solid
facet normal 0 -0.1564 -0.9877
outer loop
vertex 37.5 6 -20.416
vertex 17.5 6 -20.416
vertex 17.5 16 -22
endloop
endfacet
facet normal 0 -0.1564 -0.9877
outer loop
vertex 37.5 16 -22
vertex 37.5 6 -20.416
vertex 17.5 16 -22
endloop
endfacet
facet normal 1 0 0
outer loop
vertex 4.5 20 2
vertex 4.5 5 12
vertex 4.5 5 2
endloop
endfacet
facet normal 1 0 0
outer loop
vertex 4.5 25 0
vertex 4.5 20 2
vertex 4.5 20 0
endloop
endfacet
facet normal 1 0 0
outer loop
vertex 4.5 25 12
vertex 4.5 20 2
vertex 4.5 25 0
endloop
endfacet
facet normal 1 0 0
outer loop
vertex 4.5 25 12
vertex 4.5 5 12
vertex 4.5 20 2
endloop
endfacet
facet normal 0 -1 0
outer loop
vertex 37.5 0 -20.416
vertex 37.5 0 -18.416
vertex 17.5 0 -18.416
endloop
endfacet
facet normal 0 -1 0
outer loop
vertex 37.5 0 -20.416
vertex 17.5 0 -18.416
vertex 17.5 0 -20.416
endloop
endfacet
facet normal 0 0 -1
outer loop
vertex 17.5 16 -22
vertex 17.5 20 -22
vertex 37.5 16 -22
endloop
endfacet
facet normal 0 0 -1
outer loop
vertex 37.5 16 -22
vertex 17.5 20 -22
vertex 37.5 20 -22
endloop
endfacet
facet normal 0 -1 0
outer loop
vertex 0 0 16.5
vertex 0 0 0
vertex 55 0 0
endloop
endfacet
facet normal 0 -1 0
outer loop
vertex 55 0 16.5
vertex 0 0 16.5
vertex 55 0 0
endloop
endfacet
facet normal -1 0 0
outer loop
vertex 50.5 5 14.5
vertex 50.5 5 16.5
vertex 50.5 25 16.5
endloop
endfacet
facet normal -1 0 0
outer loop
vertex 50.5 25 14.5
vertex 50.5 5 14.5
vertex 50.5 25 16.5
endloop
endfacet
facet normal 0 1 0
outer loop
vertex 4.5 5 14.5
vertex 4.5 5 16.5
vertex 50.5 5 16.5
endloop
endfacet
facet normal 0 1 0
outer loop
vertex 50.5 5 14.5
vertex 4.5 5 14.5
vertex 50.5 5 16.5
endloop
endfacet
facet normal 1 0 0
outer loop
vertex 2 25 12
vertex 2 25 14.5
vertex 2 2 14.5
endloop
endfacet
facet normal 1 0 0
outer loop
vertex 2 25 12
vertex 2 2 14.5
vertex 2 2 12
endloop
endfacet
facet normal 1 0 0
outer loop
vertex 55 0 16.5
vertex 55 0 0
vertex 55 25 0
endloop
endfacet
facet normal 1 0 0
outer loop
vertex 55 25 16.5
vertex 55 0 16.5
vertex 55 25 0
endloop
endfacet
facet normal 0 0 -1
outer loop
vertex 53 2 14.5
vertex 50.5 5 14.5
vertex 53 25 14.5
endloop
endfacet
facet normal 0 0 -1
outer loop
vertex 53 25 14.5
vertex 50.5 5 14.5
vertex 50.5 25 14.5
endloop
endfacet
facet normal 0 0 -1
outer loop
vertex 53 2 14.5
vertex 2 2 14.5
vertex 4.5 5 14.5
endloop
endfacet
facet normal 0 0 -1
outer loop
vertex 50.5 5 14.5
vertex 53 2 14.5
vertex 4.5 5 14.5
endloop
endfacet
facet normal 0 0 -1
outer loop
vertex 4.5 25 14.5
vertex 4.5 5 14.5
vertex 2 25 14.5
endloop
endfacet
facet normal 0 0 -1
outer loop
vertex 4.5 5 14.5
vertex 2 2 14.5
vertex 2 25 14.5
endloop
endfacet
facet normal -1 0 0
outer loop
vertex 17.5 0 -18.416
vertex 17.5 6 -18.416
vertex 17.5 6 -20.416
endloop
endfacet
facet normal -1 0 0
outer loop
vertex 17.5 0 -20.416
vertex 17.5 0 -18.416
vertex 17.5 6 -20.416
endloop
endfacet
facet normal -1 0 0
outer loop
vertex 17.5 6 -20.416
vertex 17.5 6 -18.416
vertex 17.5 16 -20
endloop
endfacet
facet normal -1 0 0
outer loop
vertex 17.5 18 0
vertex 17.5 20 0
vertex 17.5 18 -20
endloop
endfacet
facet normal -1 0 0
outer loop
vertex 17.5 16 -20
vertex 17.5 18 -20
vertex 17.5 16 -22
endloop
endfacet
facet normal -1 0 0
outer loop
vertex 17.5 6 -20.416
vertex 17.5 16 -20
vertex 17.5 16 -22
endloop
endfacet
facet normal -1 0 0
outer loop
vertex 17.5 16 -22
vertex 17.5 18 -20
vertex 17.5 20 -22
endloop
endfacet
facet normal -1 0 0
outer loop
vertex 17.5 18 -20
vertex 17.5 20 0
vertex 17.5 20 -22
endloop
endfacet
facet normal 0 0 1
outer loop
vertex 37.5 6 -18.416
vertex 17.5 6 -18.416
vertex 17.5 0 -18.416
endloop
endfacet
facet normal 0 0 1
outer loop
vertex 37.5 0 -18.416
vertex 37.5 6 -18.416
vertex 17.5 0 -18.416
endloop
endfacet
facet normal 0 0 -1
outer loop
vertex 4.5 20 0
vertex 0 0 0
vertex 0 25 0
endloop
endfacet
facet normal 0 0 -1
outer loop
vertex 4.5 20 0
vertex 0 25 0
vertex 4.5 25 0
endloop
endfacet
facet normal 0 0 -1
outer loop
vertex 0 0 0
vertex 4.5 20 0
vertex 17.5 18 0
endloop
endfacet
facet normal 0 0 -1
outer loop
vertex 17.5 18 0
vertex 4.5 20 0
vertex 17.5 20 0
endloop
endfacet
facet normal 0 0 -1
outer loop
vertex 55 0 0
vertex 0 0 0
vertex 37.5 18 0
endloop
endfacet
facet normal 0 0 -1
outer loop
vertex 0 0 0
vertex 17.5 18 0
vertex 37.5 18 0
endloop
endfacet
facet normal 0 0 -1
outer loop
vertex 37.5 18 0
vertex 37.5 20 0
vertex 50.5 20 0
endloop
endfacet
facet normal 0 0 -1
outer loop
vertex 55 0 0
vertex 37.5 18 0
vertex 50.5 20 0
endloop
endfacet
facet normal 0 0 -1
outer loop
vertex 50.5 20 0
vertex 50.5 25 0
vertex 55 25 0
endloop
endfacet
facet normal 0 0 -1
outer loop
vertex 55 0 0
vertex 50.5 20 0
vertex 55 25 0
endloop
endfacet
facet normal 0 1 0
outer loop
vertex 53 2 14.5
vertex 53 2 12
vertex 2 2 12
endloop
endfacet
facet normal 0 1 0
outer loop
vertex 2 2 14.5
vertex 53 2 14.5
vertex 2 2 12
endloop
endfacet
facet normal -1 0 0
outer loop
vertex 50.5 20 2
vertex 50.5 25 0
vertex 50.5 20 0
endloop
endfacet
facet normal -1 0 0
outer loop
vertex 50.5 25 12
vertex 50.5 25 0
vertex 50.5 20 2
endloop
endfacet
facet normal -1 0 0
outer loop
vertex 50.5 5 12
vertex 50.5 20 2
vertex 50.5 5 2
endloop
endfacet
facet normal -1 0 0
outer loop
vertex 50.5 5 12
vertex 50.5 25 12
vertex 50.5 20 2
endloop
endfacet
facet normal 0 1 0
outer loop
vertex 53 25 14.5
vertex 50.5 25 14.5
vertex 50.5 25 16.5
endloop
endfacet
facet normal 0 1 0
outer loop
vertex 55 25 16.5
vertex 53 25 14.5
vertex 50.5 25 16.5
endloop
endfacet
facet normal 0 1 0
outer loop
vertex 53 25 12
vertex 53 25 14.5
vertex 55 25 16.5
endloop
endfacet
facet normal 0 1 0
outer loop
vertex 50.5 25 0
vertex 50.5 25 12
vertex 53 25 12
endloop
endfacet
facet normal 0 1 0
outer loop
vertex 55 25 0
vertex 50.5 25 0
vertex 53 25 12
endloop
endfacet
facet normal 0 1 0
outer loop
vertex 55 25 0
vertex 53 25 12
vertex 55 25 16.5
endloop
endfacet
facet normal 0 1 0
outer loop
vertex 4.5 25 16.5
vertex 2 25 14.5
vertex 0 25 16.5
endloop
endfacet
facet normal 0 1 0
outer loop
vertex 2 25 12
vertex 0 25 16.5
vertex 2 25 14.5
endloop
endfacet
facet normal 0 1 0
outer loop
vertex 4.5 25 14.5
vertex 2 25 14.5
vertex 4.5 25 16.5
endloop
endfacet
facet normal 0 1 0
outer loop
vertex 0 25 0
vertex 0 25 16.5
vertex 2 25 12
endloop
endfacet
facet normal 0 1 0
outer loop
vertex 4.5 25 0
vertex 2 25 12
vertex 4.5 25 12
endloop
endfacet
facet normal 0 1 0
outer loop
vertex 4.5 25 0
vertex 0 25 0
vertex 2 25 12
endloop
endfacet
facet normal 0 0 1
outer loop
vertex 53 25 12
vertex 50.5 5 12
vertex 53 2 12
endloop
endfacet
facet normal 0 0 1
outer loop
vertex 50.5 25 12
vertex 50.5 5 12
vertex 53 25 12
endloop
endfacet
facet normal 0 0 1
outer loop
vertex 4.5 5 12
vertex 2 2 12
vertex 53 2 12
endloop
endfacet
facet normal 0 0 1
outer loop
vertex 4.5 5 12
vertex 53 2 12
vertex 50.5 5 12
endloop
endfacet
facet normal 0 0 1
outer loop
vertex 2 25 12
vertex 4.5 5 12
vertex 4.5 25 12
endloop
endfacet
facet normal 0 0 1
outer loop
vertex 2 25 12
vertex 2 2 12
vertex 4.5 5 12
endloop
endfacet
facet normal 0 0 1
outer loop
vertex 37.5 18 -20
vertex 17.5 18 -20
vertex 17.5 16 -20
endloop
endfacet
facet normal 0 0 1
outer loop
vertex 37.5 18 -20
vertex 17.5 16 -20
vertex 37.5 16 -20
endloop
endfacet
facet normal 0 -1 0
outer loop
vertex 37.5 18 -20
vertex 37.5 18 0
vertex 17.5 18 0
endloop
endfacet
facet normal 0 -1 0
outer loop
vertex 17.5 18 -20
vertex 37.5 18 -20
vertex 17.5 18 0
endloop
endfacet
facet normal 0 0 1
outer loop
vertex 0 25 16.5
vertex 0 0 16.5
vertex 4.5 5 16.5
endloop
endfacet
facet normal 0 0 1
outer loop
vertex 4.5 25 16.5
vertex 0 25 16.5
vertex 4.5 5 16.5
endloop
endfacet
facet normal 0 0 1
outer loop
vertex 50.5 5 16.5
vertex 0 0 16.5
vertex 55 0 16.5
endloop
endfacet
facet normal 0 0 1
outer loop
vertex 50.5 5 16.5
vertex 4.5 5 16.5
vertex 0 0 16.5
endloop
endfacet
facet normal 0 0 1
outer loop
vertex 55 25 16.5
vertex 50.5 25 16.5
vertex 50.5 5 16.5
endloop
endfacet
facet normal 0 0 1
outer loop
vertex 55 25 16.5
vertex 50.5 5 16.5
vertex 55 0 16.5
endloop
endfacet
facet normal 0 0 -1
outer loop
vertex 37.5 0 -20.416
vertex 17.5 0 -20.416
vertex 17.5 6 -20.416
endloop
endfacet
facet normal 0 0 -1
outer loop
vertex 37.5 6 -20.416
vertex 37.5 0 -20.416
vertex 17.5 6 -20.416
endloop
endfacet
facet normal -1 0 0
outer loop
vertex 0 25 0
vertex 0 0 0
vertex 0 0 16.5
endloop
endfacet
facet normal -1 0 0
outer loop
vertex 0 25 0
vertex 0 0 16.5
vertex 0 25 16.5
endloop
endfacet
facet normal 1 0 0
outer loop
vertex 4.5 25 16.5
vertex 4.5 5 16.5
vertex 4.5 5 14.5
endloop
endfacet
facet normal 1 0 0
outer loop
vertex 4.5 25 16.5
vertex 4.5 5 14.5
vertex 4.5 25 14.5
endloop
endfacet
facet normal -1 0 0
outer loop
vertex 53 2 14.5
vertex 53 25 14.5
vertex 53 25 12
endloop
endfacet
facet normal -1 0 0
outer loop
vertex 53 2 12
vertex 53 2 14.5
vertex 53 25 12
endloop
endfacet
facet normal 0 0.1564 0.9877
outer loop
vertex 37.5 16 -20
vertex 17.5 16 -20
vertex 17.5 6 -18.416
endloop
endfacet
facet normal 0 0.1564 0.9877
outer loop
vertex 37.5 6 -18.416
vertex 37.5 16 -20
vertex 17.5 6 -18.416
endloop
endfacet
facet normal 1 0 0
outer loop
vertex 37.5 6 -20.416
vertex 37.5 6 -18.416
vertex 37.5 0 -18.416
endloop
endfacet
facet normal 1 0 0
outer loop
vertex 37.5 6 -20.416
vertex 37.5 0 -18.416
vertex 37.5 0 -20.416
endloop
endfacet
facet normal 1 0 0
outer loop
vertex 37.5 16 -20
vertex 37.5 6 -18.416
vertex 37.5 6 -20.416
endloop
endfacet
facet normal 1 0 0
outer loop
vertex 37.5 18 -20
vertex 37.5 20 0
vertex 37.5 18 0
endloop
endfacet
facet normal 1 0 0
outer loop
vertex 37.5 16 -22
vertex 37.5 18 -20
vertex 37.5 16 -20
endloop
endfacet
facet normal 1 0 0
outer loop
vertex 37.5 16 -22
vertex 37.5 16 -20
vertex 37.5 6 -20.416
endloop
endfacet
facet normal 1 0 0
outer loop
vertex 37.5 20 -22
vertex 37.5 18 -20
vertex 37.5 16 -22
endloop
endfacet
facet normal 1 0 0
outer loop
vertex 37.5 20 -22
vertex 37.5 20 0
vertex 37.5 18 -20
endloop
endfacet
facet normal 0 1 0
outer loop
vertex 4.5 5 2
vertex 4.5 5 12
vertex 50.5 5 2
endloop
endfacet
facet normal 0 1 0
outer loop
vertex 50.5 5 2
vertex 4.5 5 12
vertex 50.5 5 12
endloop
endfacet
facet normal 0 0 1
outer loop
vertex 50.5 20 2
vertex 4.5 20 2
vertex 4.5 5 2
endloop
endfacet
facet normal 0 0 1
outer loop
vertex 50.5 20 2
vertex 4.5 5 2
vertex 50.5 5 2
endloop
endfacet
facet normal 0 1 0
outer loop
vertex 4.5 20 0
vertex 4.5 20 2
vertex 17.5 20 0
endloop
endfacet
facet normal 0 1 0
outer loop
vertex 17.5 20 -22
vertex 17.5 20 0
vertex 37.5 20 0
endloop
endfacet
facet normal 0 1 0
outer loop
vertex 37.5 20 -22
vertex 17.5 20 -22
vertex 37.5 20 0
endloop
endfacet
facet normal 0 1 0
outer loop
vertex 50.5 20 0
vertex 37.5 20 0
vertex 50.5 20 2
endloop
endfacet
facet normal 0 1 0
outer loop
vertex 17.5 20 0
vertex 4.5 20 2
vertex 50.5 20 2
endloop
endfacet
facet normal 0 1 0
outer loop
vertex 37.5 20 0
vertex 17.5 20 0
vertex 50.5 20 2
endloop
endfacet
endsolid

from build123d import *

# Parameters (mm, degrees)
SKETCH1_W           = 55
SKETCH1_H           = 25
BOSS_EXTRUDE1_DEPTH = 16.5
SKETCH2_W           = 46
SKETCH2_H           = 20
CUT_EXTRUDE1_DEPTH  = 14.5
SKETCH3_W           = 2.5
SKETCH3_H           = 20
CUT_EXTRUDE2_DEPTH  = 2.5
CUT_EXTRUDE3_DEPTH  = 3
CUT_EXTRUDE4_DEPTH  = 63.130910182
SKETCH8_W           = 20
SKETCH8_H           = 2
BOSS_EXTRUDE2_DEPTH = 22
SKETCH9_W           = 20
SKETCH9_H           = 2
BOSS_EXTRUDE3_DEPTH = 2
BOSS_EXTRUDE4_DEPTH = 20


with BuildPart() as part:
    # Sketch1 → Boss-Extrude1 (new body)
    with BuildSketch(Plane.XY):
        with Locations((27.5, 12.5)):
            Rectangle(SKETCH1_W, SKETCH1_H)
    extrude(amount=BOSS_EXTRUDE1_DEPTH)

    # Sketch2 → Cut-Extrude1 (cut)
    with BuildSketch(Plane.XY.offset(16.5)):
        with Locations((27.5, 15)):
            Rectangle(SKETCH2_W, SKETCH2_H)
    extrude(amount=-CUT_EXTRUDE1_DEPTH, mode=Mode.SUBTRACT)

    # Sketch3 → Cut-Extrude2 (cut)
    with BuildSketch(Plane(origin=(4.5, 0, 0), x_dir=(0, 0, -1), z_dir=(1, 0, 0))):
        with Locations((-13.25, 15)):
            Rectangle(SKETCH3_W, SKETCH3_H)
    cut_extrude2 = extrude(amount=-CUT_EXTRUDE2_DEPTH, mode=Mode.SUBTRACT)

    # Mirror1: Cut-Extrude2 across plane
    add(cut_extrude2.mirror(Plane(origin=(27.5, 0, 0), x_dir=(0, 0, 1), z_dir=(1, 0, 0))), mode=Mode.SUBTRACT)

    # Sketch4 → Cut-Extrude3 (cut)
    with BuildSketch(Plane(origin=(0, 5, 0), x_dir=(1, 0, 0), z_dir=(0, 1, 0))):
        Polygon((4.5, -12), (50.5, -12), (53, -12), (53, -14.5), (50.5, -14.5), (4.5, -14.5), (2, -14.5), (2, -12), align=None)
    extrude(amount=-CUT_EXTRUDE3_DEPTH, mode=Mode.SUBTRACT)

    # Sketch6 → Cut-Extrude4 (cut, through all)
    with BuildSketch(Plane.XY.offset(2)):
        Polygon((27.5, 20), (4.5, 20), (4.5, 25), (50.5, 25), (50.5, 20), align=None)
    extrude(amount=-CUT_EXTRUDE4_DEPTH, mode=Mode.SUBTRACT)

    # Sketch8 → Boss-Extrude2 (add)
    with BuildSketch(Plane(origin=(0, 0, 0), x_dir=(-1, 0, 0), z_dir=(0, 0, -1))):
        with Locations((-27.5, 19)):
            Rectangle(SKETCH8_W, SKETCH8_H)
    extrude(amount=BOSS_EXTRUDE2_DEPTH)

    # Sketch9 → Boss-Extrude3 (add)
    with BuildSketch(Plane.XZ.offset(-18)):
        with Locations((27.5, -21)):
            Rectangle(SKETCH9_W, SKETCH9_H)
    extrude(amount=BOSS_EXTRUDE3_DEPTH)

    # Sketch10 → Boss-Extrude4 (add)
    with BuildSketch(Plane(origin=(37.5, 0, 0), x_dir=(0, 0, -1), z_dir=(1, 0, 0))):
        Polygon((20, 16), (18.416155597, 6), (18.416155597, 0), (20.416155597, 0), (20.416155597, 6), (22, 16), align=None)
    extrude(amount=-BOSS_EXTRUDE4_DEPTH)


solid = part.part
